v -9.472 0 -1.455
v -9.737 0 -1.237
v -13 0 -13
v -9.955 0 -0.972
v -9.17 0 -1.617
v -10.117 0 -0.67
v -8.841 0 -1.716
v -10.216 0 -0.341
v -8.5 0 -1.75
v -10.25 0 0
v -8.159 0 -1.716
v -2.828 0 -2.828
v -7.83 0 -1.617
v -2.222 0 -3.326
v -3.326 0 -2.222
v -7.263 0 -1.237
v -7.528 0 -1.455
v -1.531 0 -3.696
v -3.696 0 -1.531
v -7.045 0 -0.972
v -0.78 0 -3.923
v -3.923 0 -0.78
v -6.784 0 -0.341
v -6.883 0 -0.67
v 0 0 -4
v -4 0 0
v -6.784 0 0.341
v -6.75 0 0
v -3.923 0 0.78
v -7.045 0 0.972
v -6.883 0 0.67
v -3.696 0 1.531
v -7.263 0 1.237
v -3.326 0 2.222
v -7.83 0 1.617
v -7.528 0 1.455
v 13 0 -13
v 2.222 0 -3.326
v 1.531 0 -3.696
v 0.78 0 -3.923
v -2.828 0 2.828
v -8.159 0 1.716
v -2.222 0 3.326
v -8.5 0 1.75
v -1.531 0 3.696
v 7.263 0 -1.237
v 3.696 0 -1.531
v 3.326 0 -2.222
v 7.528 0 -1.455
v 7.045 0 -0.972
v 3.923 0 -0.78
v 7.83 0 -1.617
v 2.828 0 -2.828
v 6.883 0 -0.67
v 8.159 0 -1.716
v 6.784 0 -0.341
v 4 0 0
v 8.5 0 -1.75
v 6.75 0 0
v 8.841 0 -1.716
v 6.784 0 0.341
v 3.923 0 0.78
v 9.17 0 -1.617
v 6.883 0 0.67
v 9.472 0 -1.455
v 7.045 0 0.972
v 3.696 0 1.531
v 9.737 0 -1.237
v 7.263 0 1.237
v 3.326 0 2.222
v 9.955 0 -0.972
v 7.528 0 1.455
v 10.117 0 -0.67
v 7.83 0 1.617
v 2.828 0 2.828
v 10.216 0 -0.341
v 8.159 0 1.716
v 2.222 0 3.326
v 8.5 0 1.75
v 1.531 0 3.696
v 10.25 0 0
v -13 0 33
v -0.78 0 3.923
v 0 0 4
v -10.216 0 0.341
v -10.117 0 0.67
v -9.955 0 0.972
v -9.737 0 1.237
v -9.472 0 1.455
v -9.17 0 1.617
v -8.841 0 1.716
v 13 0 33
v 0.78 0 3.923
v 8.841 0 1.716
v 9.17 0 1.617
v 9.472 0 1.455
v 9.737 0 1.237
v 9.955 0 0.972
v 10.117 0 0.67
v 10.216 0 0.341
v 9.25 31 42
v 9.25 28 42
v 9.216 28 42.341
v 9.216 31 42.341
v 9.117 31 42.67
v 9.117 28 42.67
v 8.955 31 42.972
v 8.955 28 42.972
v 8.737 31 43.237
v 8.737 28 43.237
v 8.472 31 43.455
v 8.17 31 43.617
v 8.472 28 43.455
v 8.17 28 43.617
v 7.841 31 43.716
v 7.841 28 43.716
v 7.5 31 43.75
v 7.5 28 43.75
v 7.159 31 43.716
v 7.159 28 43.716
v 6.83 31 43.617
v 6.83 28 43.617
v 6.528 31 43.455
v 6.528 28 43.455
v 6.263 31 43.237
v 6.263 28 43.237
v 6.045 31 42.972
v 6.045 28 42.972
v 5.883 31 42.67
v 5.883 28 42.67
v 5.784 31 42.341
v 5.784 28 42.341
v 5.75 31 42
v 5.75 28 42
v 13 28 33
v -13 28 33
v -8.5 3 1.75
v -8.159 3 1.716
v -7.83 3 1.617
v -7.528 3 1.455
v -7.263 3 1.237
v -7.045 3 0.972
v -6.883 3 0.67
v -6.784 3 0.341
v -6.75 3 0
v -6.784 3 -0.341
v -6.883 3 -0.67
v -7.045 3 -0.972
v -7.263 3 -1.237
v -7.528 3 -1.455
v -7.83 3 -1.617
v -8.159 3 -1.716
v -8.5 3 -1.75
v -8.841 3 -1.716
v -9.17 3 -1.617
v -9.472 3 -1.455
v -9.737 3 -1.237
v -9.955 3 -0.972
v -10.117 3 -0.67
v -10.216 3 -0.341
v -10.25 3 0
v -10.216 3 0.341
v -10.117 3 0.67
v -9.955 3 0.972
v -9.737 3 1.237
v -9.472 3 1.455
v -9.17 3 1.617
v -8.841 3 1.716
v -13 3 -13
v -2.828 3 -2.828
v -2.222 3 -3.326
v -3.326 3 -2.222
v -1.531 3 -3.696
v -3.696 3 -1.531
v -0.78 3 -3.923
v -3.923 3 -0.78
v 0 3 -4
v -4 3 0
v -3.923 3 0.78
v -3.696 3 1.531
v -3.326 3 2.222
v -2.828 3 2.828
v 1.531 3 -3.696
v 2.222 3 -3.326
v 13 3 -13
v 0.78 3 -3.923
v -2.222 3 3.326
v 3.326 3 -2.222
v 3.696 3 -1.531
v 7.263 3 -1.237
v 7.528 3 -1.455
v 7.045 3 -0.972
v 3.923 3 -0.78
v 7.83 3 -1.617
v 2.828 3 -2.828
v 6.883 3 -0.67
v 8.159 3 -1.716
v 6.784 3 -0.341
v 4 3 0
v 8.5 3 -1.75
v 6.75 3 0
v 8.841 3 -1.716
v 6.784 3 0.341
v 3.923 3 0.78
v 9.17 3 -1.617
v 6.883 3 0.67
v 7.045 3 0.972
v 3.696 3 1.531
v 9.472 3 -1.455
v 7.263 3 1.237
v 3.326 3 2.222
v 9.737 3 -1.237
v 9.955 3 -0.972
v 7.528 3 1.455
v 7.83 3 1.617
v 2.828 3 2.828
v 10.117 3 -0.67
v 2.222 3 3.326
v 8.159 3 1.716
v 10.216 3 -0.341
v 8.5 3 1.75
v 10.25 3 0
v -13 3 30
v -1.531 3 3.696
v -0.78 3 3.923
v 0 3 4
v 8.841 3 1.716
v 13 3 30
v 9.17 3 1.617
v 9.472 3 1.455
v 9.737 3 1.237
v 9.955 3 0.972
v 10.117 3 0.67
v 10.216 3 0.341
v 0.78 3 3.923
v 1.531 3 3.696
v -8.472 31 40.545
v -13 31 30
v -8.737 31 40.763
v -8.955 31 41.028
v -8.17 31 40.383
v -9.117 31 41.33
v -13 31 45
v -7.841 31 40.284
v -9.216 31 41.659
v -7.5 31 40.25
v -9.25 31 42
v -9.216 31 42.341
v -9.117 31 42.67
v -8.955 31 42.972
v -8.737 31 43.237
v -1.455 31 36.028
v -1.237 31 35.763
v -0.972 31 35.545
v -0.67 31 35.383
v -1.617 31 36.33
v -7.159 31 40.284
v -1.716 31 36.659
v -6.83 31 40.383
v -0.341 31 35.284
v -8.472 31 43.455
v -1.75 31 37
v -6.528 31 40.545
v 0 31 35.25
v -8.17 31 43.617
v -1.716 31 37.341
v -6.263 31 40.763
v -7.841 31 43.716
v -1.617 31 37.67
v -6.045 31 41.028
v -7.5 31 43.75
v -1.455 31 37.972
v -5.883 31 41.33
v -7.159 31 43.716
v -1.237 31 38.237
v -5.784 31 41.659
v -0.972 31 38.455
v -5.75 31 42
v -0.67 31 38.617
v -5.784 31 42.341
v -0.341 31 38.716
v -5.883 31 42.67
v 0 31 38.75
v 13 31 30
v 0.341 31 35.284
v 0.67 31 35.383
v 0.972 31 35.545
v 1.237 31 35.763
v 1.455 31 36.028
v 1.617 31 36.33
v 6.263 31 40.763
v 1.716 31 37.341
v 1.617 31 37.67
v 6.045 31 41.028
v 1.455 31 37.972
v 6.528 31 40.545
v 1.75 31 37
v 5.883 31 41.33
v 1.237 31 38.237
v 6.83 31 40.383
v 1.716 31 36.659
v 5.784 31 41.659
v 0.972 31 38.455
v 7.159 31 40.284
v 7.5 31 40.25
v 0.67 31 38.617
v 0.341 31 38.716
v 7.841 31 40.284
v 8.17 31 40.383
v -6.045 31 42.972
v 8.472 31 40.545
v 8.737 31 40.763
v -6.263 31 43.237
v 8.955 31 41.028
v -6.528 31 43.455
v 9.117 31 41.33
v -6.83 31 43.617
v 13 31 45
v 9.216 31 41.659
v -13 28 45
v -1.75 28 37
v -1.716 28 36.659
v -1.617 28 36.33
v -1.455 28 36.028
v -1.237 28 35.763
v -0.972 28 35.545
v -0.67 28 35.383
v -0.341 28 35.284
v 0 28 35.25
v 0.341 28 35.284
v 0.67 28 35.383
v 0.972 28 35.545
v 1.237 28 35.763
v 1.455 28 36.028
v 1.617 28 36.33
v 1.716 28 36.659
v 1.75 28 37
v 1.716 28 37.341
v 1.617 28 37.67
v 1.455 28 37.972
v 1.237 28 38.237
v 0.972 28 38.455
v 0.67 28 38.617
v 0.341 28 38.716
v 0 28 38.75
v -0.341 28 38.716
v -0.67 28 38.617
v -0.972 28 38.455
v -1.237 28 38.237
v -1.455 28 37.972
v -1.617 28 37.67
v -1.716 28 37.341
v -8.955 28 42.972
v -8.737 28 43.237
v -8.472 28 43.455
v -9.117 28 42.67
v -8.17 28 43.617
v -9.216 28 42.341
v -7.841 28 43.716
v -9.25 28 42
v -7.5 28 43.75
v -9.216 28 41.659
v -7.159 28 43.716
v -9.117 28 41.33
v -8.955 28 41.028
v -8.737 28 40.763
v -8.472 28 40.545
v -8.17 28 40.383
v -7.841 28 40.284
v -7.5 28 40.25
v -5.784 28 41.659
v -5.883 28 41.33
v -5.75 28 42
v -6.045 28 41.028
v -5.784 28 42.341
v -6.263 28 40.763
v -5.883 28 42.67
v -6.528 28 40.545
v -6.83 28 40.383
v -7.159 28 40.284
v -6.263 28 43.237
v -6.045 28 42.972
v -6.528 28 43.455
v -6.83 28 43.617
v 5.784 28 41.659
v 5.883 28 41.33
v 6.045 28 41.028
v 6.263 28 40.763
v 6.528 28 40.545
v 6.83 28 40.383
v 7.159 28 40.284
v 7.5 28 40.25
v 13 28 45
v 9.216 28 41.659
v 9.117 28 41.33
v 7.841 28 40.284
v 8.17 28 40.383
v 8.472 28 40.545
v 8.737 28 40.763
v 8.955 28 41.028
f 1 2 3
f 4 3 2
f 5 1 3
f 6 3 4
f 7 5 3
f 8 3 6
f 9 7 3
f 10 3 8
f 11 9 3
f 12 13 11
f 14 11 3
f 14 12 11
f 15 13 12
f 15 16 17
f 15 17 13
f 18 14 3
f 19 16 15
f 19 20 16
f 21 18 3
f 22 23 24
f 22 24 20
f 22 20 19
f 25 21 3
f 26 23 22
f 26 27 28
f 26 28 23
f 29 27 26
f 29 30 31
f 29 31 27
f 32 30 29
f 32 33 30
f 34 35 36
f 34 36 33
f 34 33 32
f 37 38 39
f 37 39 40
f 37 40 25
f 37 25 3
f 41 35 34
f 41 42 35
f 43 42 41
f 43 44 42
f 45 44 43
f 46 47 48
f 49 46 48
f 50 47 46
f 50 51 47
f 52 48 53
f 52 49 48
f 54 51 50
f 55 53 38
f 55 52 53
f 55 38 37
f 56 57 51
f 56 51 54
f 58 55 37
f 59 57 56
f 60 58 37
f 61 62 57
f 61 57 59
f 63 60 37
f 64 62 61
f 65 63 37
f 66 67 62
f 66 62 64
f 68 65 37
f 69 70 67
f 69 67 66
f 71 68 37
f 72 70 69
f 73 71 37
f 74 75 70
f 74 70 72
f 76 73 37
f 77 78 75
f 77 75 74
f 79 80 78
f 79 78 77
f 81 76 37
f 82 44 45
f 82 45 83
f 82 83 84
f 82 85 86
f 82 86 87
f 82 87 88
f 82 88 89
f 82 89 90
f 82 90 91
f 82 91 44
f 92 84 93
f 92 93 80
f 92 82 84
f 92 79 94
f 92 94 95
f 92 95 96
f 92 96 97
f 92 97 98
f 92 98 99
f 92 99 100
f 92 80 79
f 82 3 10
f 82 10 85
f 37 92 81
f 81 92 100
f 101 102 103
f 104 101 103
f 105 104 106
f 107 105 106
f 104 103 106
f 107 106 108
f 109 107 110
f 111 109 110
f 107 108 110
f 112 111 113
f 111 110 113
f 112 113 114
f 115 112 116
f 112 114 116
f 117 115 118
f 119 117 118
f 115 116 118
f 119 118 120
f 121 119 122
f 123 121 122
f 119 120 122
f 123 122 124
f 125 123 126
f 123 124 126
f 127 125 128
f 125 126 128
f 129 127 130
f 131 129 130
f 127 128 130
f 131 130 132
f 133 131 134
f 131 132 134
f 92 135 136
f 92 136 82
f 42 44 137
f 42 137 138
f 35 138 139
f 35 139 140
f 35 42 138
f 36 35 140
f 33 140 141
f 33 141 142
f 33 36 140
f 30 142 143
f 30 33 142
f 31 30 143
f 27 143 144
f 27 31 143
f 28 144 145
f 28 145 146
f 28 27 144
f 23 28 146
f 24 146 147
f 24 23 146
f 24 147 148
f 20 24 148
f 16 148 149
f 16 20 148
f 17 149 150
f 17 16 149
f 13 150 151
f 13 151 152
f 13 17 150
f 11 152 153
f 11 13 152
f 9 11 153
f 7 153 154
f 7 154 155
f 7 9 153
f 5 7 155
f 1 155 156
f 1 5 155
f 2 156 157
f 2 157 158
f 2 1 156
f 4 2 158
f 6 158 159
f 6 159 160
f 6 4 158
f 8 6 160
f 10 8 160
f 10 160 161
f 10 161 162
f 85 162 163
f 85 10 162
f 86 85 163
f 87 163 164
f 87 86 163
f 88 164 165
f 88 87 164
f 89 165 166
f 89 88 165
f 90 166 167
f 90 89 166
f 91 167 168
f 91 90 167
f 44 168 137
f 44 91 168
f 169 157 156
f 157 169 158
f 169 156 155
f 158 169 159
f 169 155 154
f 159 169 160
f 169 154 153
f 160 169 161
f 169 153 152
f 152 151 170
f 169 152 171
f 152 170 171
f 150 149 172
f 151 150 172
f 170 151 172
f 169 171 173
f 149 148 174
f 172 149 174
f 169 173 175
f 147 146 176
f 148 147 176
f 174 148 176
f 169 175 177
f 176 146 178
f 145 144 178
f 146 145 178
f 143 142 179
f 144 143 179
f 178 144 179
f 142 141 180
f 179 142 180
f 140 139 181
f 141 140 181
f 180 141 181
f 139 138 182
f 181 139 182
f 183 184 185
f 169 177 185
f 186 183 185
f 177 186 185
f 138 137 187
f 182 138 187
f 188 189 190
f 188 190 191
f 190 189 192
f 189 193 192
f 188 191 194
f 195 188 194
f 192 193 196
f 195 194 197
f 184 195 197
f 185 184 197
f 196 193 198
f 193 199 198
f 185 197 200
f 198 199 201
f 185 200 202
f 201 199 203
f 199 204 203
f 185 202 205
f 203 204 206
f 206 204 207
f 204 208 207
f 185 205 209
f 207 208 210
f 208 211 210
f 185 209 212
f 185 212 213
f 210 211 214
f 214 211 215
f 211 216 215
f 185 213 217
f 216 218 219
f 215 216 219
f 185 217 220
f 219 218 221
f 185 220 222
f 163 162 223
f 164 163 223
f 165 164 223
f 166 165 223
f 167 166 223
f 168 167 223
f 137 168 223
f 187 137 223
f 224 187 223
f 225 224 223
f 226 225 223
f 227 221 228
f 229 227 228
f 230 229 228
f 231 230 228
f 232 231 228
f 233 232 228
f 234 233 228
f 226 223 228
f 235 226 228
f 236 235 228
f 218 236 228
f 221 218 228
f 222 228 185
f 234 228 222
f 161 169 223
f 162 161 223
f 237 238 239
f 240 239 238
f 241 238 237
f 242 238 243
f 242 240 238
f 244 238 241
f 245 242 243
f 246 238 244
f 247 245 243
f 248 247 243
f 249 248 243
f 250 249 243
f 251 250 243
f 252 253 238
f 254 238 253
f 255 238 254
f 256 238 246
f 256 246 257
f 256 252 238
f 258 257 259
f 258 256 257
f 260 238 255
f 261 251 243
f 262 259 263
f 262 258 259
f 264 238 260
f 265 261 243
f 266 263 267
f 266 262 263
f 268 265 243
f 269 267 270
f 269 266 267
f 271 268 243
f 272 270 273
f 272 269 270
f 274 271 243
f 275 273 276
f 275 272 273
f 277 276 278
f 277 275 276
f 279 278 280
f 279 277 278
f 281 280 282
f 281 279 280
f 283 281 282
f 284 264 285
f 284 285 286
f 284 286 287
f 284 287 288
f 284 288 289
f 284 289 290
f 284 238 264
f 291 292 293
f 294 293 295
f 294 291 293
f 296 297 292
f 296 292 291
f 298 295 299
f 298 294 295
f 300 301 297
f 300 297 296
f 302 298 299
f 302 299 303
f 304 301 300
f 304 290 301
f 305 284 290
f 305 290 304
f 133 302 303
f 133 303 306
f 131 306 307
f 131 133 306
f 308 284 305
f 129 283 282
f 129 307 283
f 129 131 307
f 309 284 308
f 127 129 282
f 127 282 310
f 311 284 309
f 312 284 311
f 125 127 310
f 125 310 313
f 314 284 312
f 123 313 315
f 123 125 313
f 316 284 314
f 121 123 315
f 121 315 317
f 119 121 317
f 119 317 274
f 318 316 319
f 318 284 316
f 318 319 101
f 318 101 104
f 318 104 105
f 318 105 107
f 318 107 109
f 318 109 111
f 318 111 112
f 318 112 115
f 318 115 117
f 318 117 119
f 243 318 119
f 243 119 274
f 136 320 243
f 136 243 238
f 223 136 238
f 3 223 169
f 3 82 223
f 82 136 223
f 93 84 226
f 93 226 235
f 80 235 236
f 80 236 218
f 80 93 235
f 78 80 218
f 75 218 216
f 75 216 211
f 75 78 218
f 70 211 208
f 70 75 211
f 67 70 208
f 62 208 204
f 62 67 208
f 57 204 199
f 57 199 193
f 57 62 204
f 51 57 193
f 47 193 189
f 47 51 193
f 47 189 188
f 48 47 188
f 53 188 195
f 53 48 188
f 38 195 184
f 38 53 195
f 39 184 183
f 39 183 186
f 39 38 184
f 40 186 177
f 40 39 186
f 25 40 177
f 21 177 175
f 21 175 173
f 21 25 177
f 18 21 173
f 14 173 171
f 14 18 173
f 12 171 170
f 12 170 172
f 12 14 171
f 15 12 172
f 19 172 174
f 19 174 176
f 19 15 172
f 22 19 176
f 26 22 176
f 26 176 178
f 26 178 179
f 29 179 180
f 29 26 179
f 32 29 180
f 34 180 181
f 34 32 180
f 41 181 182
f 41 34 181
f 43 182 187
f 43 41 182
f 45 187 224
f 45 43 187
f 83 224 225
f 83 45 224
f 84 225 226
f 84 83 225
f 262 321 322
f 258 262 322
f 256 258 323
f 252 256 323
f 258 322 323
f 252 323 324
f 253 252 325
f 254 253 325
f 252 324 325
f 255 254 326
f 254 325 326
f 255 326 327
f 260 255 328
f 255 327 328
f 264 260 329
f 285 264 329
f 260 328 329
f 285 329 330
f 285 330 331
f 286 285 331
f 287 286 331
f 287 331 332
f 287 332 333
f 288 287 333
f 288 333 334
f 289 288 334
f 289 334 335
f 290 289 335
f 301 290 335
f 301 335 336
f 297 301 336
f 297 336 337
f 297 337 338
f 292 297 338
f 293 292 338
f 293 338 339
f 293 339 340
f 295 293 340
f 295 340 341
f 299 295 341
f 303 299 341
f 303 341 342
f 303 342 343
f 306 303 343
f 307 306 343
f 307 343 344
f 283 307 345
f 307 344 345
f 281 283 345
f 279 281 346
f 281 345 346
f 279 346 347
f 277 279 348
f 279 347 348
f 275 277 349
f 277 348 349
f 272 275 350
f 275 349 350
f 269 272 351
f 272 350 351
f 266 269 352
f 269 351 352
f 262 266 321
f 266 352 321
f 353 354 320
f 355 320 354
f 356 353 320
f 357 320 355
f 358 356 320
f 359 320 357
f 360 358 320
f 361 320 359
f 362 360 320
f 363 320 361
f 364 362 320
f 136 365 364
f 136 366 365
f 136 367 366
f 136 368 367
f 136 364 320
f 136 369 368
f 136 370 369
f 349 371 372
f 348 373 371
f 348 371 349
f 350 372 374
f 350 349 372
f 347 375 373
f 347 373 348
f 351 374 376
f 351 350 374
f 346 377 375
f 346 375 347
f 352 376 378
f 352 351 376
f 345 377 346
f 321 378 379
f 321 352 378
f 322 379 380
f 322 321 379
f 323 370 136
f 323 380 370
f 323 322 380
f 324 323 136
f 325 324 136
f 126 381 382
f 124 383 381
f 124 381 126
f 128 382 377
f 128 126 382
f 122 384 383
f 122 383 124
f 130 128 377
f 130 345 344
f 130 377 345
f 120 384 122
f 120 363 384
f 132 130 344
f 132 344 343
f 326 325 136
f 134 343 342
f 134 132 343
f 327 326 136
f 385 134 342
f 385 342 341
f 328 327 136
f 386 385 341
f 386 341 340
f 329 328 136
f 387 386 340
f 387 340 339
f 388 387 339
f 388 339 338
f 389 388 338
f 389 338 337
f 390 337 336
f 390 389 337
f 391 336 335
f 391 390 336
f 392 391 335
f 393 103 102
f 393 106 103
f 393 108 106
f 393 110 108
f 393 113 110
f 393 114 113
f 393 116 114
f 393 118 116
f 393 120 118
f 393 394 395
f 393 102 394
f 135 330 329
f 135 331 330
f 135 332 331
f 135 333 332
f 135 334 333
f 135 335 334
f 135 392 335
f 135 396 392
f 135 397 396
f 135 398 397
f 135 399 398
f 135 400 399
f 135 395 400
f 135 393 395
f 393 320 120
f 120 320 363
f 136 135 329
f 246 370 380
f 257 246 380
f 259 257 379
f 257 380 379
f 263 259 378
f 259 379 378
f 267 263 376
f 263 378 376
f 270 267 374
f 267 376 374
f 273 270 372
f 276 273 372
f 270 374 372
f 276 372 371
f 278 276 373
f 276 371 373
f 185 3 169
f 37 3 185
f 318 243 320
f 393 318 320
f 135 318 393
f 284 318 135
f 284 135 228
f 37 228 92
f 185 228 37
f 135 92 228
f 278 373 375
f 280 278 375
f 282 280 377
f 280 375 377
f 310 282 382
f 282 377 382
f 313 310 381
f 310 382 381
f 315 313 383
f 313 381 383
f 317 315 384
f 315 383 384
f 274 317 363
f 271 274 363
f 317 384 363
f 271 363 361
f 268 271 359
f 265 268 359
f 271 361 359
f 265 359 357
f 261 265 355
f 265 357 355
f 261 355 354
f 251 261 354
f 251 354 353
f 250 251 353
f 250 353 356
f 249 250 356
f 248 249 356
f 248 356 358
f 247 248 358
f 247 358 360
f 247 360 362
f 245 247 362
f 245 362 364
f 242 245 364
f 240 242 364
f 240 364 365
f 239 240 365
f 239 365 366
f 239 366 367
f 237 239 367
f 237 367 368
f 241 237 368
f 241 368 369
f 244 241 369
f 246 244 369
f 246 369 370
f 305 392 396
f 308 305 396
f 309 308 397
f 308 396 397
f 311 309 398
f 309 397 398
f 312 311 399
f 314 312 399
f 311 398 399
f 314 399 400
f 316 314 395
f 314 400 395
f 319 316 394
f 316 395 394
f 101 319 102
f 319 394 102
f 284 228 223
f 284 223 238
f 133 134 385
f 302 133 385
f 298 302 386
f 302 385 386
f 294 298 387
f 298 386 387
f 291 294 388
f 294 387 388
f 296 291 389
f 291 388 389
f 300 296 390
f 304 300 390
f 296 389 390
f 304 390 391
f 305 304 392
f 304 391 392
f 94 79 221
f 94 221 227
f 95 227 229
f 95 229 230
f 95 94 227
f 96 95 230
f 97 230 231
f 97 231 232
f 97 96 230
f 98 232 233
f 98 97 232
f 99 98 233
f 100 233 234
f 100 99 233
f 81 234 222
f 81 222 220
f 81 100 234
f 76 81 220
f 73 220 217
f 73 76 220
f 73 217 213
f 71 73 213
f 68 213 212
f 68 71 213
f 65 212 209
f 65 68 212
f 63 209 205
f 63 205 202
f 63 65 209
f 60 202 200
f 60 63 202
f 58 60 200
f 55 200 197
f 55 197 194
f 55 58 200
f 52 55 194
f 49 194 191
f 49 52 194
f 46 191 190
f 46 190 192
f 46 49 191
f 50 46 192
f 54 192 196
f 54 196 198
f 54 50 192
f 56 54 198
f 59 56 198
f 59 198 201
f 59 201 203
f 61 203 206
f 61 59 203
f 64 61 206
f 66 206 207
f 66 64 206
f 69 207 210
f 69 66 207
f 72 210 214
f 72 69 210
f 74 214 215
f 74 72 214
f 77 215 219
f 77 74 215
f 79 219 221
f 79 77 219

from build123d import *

# Parameters (mm, degrees)
SKETCH_1_R          = 4
SKETCH_1_R_2        = 1.75
EXTRUDE_1_DEPTH     = 3
EXTRUDE_2_DEPTH     = 26
CUT_EXTRUDE_1_DEPTH = 55.571054599
EXTRUDE_4_DEPTH     = 3


with BuildPart() as part:
    # 草图1 → 凸台-拉伸1 (new body)
    with BuildSketch(Plane(origin=(0, 0, 0), x_dir=(1, 0, 0), z_dir=(0, 1, 0))):
        with BuildLine():
            Line((-13, 0), (-13, -30))
            Line((-13, -30), (13, -30))
            Line((13, -30), (13, 0))
            ThreePointArc((13, 0), (0, 13), (-13, 0))
        make_face()
        with Locations(Location((0, 0, 0), (0, 0, 270))):
            Circle(SKETCH_1_R, mode=Mode.SUBTRACT)
        with Locations(Location((8.5, 0, 0), (0, 0, 270))):
            Circle(SKETCH_1_R_2, mode=Mode.SUBTRACT)
        with Locations(Location((-8.5, 0, 0), (0, 0, 270))):
            Circle(SKETCH_1_R_2, mode=Mode.SUBTRACT)
    extrude(amount=EXTRUDE_1_DEPTH)

    # 草图4 → 凸台-拉伸2 (add)
    with BuildSketch(Plane(origin=(13, 0, 0), x_dir=(0, 0, -1), z_dir=(1, 0, 0))):
        Polygon((-30, 3), (-30, 31), (-45, 31), (-45, 28), (-33, 28), (-33, 0), (-30, 0), align=None)
    extrude(amount=-EXTRUDE_2_DEPTH)

    # 草图6 → 切除-拉伸1 (cut, through all)
    with BuildSketch(Plane.XZ.offset(-28)):
        with BuildLine():
            ThreePointArc((9.25, 42), (7.5, 43.75), (5.75, 42))
            Line((5.75, 42), (7.5, 42))
            Line((7.5, 42), (7.5, 40.25))
            ThreePointArc((7.5, 40.25), (8.737436867, 40.762563133), (9.25, 42))
        make_face()
        with BuildLine():
            Line((7.5, 42), (5.75, 42))
            ThreePointArc((5.75, 42), (6.262563133, 40.762563133), (7.5, 40.25))
            Line((7.5, 40.25), (7.5, 42))
        make_face()
        with BuildLine():
            ThreePointArc((1.75, 37), (0, 38.75), (-1.75, 37))
            Line((-1.75, 37), (1.75, 37))
        make_face()
        with BuildLine():
            Line((1.75, 37), (-1.75, 37))
            ThreePointArc((-1.75, 37), (0, 35.25), (1.75, 37))
        make_face()
        with BuildLine():
            Line((-7.5, 40.25), (-7.5, 42))
            Line((-7.5, 42), (-5.75, 42))
            ThreePointArc((-5.75, 42), (-8.737436867, 43.237436867), (-7.5, 40.25))
        make_face()
        with BuildLine():
            Line((-5.75, 42), (-7.5, 42))
            Line((-7.5, 42), (-7.5, 40.25))
            ThreePointArc((-7.5, 40.25), (-6.262563133, 40.762563133), (-5.75, 42))
        make_face()
    extrude(amount=-CUT_EXTRUDE_1_DEPTH, mode=Mode.SUBTRACT)

    # 草图7 → 凸台-拉伸4 (add)
    with BuildSketch(Plane.XZ):
        with BuildLine():
            ThreePointArc((-6.7e-08, -13), (-9.192388179, -9.192388132), (-13, 0))
            Line((-13, 0), (-13, -13))
            Line((-13, -13), (-6.7e-08, -13))
        make_face()
        with BuildLine():
            ThreePointArc((13, 0), (9.192388132, -9.192388179), (-6.7e-08, -13))
            Line((-6.7e-08, -13), (13, -13))
            Line((13, -13), (13, 0))
        make_face()
    extrude(amount=-EXTRUDE_4_DEPTH)


solid = part.part
